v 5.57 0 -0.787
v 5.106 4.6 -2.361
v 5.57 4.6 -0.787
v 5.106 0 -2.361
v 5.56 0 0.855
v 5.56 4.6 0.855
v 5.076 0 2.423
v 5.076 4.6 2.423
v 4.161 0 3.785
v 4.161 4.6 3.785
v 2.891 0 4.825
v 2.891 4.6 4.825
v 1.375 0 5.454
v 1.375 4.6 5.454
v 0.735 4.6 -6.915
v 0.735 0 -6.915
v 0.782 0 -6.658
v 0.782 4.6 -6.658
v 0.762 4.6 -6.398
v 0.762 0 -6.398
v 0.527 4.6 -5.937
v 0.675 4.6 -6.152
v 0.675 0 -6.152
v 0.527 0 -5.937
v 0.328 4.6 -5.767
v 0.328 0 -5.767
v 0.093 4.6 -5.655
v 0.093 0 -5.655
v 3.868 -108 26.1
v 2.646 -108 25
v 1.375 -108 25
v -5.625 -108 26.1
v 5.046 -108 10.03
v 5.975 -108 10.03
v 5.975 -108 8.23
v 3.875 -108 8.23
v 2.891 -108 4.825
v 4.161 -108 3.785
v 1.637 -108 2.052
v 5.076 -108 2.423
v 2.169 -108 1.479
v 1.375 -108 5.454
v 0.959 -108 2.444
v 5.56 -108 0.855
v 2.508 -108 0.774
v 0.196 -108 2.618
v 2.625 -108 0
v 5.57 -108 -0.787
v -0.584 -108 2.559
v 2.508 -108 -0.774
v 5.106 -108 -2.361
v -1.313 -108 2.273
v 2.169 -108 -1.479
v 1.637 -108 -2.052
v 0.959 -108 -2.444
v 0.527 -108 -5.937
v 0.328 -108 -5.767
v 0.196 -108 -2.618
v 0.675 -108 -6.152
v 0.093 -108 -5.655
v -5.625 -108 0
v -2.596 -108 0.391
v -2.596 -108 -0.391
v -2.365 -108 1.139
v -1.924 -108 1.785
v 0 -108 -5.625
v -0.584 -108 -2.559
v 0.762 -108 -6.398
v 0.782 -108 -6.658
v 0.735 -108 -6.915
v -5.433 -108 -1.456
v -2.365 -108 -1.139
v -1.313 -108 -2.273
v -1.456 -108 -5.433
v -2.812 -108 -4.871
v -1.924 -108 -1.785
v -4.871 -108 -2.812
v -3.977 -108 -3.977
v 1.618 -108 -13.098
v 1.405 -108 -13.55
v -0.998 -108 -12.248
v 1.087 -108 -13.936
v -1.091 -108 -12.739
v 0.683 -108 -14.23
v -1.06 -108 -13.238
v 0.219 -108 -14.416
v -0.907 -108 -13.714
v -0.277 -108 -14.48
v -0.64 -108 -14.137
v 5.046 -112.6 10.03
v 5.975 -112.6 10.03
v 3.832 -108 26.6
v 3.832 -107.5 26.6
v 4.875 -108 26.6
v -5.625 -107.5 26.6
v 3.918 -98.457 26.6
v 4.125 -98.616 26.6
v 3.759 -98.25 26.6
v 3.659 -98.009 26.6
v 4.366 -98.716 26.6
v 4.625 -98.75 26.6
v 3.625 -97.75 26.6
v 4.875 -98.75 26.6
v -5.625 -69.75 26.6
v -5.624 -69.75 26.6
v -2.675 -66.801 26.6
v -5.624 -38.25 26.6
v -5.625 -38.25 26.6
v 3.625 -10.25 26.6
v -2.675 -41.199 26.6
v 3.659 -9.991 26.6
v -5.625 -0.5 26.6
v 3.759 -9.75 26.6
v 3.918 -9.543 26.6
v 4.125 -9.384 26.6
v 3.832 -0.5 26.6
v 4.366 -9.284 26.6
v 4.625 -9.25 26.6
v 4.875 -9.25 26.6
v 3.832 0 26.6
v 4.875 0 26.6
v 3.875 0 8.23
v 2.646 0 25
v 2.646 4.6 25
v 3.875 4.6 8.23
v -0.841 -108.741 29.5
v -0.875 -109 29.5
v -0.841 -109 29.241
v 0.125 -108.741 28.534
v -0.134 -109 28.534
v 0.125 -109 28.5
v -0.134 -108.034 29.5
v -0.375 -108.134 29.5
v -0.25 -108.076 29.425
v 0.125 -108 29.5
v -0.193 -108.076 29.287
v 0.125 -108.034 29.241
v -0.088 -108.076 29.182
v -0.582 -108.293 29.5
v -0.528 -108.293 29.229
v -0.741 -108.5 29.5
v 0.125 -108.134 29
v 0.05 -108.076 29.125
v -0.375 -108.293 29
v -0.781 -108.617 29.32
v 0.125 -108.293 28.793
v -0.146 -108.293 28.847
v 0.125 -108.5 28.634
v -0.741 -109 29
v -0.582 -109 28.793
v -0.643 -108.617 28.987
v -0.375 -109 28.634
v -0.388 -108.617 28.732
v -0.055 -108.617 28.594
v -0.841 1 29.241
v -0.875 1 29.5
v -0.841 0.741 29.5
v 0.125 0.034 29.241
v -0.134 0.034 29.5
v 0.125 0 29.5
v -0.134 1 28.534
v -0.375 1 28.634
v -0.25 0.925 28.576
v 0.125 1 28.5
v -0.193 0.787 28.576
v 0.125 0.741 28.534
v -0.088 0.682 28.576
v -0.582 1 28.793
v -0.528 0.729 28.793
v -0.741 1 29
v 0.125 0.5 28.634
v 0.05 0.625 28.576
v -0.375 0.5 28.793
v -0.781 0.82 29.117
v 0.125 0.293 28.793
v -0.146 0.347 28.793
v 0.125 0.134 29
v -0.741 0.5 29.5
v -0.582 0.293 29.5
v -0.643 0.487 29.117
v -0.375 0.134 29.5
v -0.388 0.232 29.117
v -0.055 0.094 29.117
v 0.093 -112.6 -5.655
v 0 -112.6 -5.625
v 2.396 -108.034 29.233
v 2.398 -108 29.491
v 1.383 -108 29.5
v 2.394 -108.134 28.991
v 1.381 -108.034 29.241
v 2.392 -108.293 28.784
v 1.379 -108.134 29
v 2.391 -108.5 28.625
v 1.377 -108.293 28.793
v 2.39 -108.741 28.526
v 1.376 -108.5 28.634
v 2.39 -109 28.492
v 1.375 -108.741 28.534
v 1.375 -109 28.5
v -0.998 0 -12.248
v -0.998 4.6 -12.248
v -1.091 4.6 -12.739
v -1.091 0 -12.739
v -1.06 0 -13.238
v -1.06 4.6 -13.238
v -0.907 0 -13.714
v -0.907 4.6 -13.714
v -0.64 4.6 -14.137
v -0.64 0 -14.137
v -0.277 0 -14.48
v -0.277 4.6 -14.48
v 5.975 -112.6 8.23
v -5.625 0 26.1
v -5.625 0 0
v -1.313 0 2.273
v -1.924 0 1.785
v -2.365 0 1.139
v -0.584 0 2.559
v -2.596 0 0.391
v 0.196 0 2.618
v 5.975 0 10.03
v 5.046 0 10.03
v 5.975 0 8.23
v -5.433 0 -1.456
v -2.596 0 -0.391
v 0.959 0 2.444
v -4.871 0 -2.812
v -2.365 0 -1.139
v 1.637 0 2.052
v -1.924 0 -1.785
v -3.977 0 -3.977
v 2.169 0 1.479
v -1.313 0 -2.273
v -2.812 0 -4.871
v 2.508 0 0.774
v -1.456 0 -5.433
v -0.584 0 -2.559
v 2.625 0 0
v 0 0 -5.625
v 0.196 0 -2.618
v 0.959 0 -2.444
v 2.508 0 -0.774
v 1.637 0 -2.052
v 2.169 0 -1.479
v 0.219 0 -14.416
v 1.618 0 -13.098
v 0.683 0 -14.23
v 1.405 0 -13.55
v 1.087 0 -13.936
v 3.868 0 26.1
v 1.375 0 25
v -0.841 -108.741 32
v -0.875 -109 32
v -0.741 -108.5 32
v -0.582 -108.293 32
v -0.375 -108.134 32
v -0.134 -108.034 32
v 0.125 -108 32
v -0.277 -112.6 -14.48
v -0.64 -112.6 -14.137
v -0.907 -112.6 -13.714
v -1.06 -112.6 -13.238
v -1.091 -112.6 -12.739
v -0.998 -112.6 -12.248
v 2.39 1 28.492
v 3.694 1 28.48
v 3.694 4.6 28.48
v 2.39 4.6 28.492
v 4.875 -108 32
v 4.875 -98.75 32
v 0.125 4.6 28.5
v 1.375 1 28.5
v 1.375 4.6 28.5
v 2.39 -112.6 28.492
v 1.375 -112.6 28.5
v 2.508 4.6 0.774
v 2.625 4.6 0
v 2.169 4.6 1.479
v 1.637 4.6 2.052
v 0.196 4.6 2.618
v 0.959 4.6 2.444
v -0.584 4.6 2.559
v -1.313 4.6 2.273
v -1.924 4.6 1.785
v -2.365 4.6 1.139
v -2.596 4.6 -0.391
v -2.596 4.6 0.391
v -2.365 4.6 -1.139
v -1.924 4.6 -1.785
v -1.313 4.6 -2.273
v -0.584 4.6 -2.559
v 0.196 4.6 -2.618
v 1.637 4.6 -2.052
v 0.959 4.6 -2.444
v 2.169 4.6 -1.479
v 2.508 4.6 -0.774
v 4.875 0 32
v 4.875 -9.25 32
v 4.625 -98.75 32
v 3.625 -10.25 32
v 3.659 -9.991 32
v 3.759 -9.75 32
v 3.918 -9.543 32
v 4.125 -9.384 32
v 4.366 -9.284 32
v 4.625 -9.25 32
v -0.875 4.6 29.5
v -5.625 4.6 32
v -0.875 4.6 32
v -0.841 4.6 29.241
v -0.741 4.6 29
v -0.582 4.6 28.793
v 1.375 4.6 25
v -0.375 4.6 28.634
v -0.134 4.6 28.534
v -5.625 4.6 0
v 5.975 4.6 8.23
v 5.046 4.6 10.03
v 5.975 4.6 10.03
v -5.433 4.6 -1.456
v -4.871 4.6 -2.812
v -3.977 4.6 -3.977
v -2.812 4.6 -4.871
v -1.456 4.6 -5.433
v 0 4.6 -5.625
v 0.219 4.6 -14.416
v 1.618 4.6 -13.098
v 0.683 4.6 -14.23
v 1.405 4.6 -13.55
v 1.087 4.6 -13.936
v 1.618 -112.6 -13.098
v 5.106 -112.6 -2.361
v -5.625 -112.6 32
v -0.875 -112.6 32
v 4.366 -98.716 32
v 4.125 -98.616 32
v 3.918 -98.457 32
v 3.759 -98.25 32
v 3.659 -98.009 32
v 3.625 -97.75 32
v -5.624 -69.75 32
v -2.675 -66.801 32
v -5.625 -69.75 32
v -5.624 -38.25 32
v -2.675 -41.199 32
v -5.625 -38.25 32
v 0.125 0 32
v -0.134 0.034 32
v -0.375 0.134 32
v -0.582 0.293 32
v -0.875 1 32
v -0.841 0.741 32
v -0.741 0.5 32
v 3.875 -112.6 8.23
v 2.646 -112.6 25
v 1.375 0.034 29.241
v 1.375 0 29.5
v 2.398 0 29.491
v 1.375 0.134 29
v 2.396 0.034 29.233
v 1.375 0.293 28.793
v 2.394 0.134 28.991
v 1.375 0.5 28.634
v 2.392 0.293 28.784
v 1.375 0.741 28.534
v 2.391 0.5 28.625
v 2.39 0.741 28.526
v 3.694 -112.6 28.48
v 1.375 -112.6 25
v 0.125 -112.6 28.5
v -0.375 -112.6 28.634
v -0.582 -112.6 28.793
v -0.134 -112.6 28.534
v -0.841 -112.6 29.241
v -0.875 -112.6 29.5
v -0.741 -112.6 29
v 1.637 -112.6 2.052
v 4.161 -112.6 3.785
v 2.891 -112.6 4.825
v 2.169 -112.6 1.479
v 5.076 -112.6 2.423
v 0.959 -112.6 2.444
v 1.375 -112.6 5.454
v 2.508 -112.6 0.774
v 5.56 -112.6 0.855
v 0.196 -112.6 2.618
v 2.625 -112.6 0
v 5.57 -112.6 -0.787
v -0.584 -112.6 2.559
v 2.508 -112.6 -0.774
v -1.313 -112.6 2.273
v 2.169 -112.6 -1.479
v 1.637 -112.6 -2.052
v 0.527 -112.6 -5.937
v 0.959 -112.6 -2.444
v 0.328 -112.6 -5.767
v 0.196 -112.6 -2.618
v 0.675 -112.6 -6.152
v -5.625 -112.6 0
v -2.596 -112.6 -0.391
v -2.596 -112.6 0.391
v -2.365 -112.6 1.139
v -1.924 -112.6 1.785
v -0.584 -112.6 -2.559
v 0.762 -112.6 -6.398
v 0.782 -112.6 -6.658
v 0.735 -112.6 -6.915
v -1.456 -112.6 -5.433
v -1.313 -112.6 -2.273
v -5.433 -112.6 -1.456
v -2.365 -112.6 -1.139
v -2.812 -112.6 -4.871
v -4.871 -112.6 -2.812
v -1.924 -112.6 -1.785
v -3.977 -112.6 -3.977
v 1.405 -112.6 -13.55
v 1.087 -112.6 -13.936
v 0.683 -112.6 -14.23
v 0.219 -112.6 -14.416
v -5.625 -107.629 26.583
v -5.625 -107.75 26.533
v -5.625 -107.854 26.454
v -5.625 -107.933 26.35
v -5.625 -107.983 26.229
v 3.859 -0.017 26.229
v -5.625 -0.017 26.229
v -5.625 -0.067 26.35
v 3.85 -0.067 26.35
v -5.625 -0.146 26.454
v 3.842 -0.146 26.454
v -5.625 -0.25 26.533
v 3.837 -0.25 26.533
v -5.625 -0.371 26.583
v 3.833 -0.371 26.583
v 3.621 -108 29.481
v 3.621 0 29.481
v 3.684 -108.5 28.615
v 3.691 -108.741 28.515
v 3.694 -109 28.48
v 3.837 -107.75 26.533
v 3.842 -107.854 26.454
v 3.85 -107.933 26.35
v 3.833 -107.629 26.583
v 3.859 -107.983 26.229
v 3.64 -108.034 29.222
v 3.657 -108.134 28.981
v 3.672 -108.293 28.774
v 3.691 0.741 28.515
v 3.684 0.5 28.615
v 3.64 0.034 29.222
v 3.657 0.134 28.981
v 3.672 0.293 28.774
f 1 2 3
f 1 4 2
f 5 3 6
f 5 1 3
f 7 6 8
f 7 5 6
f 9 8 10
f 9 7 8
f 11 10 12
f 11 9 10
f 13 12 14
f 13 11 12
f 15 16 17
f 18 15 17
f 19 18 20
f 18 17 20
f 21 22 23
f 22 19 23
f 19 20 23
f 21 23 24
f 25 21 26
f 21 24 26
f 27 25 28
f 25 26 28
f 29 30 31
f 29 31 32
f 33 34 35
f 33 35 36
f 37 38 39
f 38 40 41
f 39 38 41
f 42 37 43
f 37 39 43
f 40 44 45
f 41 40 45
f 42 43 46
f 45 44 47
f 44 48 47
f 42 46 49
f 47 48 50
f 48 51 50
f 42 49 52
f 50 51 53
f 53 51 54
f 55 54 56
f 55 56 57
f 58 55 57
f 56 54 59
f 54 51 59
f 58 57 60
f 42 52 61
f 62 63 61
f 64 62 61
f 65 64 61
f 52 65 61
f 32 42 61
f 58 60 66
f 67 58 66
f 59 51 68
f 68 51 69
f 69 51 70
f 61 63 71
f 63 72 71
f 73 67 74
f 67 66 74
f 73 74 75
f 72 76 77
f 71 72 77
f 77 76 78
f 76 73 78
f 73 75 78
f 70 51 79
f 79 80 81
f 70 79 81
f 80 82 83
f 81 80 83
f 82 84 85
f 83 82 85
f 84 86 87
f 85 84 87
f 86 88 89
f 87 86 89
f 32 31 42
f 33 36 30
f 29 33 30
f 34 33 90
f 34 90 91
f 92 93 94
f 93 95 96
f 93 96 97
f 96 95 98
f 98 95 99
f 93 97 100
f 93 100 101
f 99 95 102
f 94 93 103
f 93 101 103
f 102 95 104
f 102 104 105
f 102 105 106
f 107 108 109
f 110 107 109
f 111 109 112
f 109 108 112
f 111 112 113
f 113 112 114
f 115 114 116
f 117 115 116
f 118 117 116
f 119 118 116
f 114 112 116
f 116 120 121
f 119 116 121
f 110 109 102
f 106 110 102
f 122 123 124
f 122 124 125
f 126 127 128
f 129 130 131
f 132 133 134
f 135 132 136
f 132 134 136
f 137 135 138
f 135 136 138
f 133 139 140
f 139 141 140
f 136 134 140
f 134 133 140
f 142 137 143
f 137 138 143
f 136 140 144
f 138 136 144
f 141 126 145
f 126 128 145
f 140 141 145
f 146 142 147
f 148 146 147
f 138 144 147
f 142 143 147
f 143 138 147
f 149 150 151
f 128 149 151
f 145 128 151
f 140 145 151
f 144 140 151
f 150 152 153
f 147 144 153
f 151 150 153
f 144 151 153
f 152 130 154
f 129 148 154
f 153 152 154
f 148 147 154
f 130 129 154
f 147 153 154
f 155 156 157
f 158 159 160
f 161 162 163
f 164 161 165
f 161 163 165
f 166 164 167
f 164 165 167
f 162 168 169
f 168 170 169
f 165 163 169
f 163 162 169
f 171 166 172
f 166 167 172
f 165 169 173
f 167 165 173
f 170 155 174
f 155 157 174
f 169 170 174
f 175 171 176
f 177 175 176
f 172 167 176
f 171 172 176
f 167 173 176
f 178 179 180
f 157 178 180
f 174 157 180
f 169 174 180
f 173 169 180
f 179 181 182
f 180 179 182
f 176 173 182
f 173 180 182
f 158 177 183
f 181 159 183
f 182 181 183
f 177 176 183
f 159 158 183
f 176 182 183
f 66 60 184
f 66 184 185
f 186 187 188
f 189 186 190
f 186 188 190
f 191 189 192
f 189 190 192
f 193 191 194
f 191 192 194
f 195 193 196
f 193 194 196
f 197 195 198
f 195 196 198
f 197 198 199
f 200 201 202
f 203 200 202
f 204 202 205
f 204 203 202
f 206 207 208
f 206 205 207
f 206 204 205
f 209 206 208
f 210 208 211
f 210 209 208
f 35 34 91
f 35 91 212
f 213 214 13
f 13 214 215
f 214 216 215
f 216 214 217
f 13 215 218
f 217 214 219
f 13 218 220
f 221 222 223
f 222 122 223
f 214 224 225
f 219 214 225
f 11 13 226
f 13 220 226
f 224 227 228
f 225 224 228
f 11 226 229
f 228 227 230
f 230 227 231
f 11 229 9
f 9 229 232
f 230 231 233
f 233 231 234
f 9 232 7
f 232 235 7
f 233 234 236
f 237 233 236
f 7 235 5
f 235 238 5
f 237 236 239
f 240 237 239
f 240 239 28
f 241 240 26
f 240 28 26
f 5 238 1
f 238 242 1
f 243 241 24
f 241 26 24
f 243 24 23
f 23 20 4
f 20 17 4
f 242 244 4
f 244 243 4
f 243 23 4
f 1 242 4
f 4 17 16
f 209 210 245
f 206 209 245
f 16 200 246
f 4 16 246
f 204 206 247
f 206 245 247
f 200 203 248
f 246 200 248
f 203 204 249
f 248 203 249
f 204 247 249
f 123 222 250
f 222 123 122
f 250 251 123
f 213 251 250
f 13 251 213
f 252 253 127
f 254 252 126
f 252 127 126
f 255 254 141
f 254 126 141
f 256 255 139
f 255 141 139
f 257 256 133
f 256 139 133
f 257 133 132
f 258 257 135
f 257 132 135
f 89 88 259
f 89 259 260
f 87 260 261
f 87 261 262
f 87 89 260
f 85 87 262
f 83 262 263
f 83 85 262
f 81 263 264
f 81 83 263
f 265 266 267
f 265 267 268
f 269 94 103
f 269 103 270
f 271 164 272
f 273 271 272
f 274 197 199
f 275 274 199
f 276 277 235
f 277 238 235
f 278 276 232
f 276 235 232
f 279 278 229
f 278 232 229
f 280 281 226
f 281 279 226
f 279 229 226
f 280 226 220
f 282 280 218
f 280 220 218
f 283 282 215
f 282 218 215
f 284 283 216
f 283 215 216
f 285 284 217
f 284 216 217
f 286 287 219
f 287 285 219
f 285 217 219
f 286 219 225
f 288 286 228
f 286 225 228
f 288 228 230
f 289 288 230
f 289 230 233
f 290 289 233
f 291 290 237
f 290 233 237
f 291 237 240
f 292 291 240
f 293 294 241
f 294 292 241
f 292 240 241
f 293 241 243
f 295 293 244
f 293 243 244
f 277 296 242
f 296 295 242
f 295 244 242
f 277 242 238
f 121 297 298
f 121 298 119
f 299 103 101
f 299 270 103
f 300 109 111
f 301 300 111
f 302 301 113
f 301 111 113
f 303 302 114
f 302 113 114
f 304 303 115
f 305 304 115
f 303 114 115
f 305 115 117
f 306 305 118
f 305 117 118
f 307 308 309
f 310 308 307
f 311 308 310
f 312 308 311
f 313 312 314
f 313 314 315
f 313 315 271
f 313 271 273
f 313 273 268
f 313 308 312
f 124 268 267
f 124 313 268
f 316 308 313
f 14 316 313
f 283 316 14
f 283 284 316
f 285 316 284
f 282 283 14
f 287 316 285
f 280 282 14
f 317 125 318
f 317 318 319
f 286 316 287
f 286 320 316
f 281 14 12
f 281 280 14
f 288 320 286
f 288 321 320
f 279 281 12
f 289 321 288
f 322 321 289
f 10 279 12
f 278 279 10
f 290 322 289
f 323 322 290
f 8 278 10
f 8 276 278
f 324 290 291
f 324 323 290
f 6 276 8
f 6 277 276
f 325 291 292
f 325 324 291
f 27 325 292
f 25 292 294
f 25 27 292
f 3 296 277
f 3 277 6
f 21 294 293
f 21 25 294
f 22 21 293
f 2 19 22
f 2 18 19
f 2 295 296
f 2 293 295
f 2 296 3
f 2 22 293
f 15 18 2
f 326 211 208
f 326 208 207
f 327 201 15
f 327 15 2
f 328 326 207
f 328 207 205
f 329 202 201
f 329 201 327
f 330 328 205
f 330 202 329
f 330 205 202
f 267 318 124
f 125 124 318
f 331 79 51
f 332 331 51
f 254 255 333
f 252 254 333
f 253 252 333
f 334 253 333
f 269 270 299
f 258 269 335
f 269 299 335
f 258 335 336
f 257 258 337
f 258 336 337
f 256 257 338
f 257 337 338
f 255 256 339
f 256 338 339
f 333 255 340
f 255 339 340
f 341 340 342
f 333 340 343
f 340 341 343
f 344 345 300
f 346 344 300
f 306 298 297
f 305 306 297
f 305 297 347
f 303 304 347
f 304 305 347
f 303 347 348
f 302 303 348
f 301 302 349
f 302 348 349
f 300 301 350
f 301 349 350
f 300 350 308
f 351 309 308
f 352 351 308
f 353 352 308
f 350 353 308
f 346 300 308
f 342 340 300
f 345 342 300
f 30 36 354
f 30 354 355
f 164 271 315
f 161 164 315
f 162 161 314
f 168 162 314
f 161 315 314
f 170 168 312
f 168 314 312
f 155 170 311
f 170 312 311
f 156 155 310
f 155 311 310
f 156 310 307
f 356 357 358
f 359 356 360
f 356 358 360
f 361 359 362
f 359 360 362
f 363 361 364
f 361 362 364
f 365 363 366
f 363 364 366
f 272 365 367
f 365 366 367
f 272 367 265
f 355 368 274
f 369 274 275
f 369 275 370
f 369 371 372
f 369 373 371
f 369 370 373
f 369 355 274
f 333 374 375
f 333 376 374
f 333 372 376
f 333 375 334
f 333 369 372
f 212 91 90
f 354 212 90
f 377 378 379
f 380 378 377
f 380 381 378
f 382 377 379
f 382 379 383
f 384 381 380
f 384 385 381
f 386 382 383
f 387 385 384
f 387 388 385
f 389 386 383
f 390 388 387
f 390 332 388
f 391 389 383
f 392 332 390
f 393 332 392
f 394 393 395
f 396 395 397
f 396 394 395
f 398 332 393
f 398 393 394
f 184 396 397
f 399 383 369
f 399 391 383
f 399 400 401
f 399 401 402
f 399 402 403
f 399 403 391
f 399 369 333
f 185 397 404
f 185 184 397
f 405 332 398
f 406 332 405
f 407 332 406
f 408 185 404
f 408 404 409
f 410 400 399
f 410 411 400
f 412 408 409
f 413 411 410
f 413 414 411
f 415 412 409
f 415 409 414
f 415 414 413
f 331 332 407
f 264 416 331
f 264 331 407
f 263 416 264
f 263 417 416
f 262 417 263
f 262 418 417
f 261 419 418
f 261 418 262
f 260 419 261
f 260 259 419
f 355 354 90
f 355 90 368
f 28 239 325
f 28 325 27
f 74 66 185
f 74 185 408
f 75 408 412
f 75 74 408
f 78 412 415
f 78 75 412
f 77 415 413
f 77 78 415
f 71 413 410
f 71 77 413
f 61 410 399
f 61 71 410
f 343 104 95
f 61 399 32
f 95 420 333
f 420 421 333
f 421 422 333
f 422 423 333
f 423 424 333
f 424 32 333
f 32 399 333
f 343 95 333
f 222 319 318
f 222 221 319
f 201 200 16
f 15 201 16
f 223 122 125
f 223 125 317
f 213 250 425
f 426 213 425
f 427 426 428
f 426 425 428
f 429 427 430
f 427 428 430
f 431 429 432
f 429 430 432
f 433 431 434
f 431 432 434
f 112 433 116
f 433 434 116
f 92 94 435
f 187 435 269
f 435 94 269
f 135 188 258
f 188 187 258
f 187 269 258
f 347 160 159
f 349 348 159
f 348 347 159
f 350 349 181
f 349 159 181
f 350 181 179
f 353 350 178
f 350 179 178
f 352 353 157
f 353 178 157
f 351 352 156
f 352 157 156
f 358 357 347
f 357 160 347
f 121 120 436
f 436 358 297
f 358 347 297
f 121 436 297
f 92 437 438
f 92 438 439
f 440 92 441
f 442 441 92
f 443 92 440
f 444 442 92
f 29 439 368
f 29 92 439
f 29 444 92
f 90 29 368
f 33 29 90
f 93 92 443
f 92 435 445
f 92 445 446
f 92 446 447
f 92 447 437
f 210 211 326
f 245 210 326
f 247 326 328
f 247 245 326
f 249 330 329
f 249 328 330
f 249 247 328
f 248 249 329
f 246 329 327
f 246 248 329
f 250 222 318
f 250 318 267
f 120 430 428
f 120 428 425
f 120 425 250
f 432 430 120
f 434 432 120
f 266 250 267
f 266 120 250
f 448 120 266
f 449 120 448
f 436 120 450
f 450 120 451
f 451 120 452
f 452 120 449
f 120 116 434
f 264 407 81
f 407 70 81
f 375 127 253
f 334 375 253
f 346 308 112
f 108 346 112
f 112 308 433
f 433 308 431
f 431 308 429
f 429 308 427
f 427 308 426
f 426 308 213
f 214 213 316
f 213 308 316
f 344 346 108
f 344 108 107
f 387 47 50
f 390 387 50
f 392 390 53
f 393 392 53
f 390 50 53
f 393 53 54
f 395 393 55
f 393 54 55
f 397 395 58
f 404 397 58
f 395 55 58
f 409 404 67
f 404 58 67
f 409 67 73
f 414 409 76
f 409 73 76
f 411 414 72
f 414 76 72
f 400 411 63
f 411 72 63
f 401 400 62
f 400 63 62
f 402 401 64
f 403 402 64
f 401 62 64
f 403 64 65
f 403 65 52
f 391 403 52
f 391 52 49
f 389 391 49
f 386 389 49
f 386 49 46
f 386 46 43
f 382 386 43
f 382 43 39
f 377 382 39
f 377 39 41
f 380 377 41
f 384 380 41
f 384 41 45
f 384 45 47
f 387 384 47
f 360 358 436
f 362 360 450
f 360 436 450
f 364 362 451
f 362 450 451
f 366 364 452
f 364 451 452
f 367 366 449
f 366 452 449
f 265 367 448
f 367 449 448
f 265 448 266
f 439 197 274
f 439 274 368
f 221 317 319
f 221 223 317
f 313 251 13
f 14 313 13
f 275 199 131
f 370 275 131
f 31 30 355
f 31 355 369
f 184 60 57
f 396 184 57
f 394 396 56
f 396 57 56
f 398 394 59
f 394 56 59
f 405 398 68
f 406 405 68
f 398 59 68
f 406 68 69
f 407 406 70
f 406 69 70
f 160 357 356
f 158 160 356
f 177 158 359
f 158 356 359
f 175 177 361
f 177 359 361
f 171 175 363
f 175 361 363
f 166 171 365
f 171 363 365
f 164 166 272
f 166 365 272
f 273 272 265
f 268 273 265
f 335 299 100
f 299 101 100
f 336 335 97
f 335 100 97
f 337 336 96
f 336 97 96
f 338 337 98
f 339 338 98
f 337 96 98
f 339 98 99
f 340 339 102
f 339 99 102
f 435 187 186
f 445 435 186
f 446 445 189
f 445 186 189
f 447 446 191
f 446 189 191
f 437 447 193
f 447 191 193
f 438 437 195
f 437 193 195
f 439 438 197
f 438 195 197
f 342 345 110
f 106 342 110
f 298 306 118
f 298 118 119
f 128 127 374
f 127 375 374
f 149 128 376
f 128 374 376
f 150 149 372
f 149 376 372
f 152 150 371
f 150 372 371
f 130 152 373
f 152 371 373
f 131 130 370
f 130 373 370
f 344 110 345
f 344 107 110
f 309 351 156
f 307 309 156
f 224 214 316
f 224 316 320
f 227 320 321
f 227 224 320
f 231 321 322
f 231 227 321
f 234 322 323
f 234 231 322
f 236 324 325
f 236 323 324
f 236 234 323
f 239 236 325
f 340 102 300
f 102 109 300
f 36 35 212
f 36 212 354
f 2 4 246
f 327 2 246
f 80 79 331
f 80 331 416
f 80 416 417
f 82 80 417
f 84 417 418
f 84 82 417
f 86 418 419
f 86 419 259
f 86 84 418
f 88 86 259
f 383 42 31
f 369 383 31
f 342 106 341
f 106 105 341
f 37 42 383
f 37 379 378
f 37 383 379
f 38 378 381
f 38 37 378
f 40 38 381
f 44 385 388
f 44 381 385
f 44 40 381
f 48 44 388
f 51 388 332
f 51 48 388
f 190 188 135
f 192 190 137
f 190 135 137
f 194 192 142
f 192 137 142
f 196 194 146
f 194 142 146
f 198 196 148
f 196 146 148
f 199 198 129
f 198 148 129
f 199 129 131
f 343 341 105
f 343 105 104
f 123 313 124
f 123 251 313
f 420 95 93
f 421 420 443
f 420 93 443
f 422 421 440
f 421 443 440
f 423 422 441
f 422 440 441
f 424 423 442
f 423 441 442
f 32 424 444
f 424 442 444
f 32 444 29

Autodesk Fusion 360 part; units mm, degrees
sketch "Sketch4" plane through (0, 0, 0) normal (0, 1, 0) x (1, 0, 0)
  circle A0 centre (0, 0) radius 2.625
  circle A1 centre (0, 0) radius 5.625
  line L0 (-5.625, 0) -> (-5.625, -32)
  line L1 (-5.625, -32) -> (-0.875, -32)
  line L2 (1.375, -28.5) -> (1.375, -5.4544)
  line L3 (5.1055, 2.361) -> (1.6179, 13.0978)
  line L4 (-0.9022, 14.3821) -> (0.2867, 14.7683)
  line L5 (-0.9976, 12.2483) -> (0.7348, 6.9151)
  line L6 (1.375, -28.5) -> (2.3896, -28.4915)
  line L7 (2.3896, -28.4915) -> (3.875, -8.23)
  line L8 (3.875, -8.23) -> (5.975, -8.23)
  line L9 (5.975, -8.23) -> (5.975, -10.03)
  line L10 (5.975, -10.03) -> (5.0465, -10.03)
  line L11 (5.0465, -10.03) -> (3.6939, -28.4805)
  line L12 (3.6939, -28.4805) -> (2.3896, -28.4915)
  line L13 (1.375, -28.5) -> (1.3456, -25.0001)
  line L14 (1.3456, -25.0001) -> (2.6456, -25.0001)
  arc A2 (0.2867, 14.7683) -> (-0.9976, 12.2483) centre (0.9046, 12.8661) ccw
  arc A3 (1.6179, 13.0978) -> (-0.9022, 14.3821) centre (-0.2843, 12.48) ccw
  line L15 (0, 5.625) -> (0.0926, 5.6551)
  arc A4 (0.0926, 5.6551) -> (0.7348, 6.9151) centre (-0.2163, 6.6062) ccw
  line L16 (-5.625, -32) -> (-0.875, -32)
  line L17 (-0.875, -32) -> (-0.875, -28.5)
  line L18 (-0.875, -28.5) -> (1.375, -28.5)
  dimension "d17" = 5.25
  dimension "d18" = 11.25
  dimension "d19" = 32
  dimension "d23" = 3.5
  dimension "d24" = 18.5
  dimension "d25" = 1.8
  dimension "d26" = 2.1
  dimension "d28" = 1.3
  dimension "d29" = 1.3
  dimension "d30" = 2.5
  dimension "d31" = 2
  dimension "d32" = 2.75
  dimension "d33" = 1
  dimension "d34" = 4.75
  dimension "d35" = 3.5
  dimension "d39" = 7
extrude "Extrude1" add sketch "Sketch4" along normal blind 4.6 contours A1 | A1 L3 L5 A2 A3 L15 A4 | A1 L0 L1 L2 L13 L14 L16 L17 L18 | L2 L6 L7 L14 | L2 L13 L14 | L7 L8 L9 L10 L11 L12
sketch "Sketch5" plane through (0, 0, 0) normal (0, -1, 0) x (1, 0, 0)
  circle A0 centre (0, 0) radius 2.625
  arc A1 (-5.625, 0) -> (0, -5.625) centre (0, 0) ccw
  line L0 (0, -5.625) -> (0.0926, -5.6551)
  arc A2 (0.7348, -6.9151) -> (0.0926, -5.6551) centre (-0.2163, -6.6062) ccw
  line L1 (0.7348, -6.9151) -> (-0.9976, -12.2483)
  arc A3 (-0.9976, -12.2483) -> (-0.2768, -14.4799) centre (0.9046, -12.8661) ccw
  arc A4 (-0.2768, -14.4799) -> (1.6179, -13.0978) centre (-0.2843, -12.48) ccw
  line L2 (1.6179, -13.0978) -> (5.1055, -2.361)
  arc A5 (5.1055, -2.361) -> (1.375, 5.4544) centre (0, 0) ccw
  line L3 (1.375, 5.4544) -> (1.375, 25.0001)
  line L4 (1.375, 25.0001) -> (2.6456, 25.0001)
  line L5 (2.6456, 25.0001) -> (3.875, 8.23)
  line L6 (3.875, 8.23) -> (5.975, 8.23)
  line L7 (5.975, 8.23) -> (5.975, 10.03)
  line L8 (5.975, 10.03) -> (5.0465, 10.03)
  line L9 (5.0465, 10.03) -> (3.6939, 28.4805)
  line L10 (-0.875, 28.5) -> (-0.875, 32)
  line L11 (-0.875, 32) -> (-5.625, 32)
  line L12 (-5.625, 32) -> (-5.625, 0)
  line L13 (-5.625, 26.6) -> (-5.625, 32)
  line L14 (-5.625, 32) -> (4.875, 32)
  line L15 (4.875, 32) -> (4.875, 26)
  line L16 (-5.625, 26.6) -> (4.875, 26.6)
  line L17 (4.875, 26.6) -> (4.875, 26)
  line L18 (3.6939, 28.4805) -> (1.375, 28.5)
  line L19 (1.375, 28.5) -> (-0.875, 28.5)
  dimension "d42" = 10.5
  dimension "d59" = 5.4
extrude "Extrude2" add sketch "Sketch5" along normal blind 9.25 contours L9 L10 L11 L12 L13 L14 L16 L18 L19 | L9 L10 L14 L15 L16 L18 L19
sketch "Sketch7" plane through (0, -9.25, 0) normal (0, -1, 0) x (1, 0, 0)
  line L0 (-5.625, 26.6) -> (4.875, 26.6)
  line L1 (4.875, 26.6) -> (4.875, 32)
  line L2 (4.875, 32) -> (-5.625, 32)
  line L3 (-5.625, 32) -> (-5.625, 26.6)
  line L4 (-5.625, 32) -> (3.625, 32)
  line L5 (3.625, 32) -> (3.625, 26.6)
  line L6 (3.625, 26.6) -> (-5.625, 26.6)
  line L7 (-5.625, 26.6) -> (-5.625, 32)
  dimension "d43" = 9.25
  dimension "d58" = 5.4
extrude "Extrude3" add sketch "Sketch7" along normal blind 29 contours L0 L2 L3 L4 L5 L6 L7
sketch "Sketch8" plane through (0, -38.25, 0) normal (0, -1, 0) x (1, 0, 0)
  line L0 (-5.625, 26.6) -> (3.625, 26.6)
  line L1 (3.625, 26.6) -> (3.625, 32)
  line L2 (3.625, 32) -> (-5.625, 32)
  line L3 (-5.625, 32) -> (-5.625, 26.6)
  line L4 (3.625, 32) -> (-2.675, 32)
  line L5 (-2.675, 32) -> (-2.675, 25.81)
  line L6 (-2.675, 25.81) -> (3.625, 25.81)
  line L7 (3.625, 25.81) -> (3.625, 32)
  dimension "d46" = 6.3
extrude "Extrude4" add sketch "Sketch8" along normal blind 15.75 contours L0 L1 L2 L4 L5 L7
mirror "Mirror1" about plane through (0, -54, 0) normal (0, -1, 0) of bodies 1 merged
chamfer "Chamfer1" distance 2.95 angle 45 2 edges at (-2.675, -69.75, 29.3) (-2.675, -38.25, 29.3)
fillet "Fillet1" radius 1 4 edges at (-0.875, 0, 30.25) (0.25, 0, 28.5) (2.5345, 0, 28.4903) (-0.875, 2.3, 28.5)
fillet "Fillet2" radius 1 4 edges at (-0.875, -110.3, 28.5) (2.5345, -108, 28.4903) (0.25, -108, 28.5) (-0.875, -108, 30.25)
fillet "Fillet3" radius 1 2 edges at (3.625, -98.75, 29.3) (3.625, -9.25, 29.3)
fillet "Fillet4" radius 0.5 2 edges at (-0.8966, 0, 26.6) (-0.8966, -108, 26.6)
equation "d47 = 27 mm - 11.25 mm"
